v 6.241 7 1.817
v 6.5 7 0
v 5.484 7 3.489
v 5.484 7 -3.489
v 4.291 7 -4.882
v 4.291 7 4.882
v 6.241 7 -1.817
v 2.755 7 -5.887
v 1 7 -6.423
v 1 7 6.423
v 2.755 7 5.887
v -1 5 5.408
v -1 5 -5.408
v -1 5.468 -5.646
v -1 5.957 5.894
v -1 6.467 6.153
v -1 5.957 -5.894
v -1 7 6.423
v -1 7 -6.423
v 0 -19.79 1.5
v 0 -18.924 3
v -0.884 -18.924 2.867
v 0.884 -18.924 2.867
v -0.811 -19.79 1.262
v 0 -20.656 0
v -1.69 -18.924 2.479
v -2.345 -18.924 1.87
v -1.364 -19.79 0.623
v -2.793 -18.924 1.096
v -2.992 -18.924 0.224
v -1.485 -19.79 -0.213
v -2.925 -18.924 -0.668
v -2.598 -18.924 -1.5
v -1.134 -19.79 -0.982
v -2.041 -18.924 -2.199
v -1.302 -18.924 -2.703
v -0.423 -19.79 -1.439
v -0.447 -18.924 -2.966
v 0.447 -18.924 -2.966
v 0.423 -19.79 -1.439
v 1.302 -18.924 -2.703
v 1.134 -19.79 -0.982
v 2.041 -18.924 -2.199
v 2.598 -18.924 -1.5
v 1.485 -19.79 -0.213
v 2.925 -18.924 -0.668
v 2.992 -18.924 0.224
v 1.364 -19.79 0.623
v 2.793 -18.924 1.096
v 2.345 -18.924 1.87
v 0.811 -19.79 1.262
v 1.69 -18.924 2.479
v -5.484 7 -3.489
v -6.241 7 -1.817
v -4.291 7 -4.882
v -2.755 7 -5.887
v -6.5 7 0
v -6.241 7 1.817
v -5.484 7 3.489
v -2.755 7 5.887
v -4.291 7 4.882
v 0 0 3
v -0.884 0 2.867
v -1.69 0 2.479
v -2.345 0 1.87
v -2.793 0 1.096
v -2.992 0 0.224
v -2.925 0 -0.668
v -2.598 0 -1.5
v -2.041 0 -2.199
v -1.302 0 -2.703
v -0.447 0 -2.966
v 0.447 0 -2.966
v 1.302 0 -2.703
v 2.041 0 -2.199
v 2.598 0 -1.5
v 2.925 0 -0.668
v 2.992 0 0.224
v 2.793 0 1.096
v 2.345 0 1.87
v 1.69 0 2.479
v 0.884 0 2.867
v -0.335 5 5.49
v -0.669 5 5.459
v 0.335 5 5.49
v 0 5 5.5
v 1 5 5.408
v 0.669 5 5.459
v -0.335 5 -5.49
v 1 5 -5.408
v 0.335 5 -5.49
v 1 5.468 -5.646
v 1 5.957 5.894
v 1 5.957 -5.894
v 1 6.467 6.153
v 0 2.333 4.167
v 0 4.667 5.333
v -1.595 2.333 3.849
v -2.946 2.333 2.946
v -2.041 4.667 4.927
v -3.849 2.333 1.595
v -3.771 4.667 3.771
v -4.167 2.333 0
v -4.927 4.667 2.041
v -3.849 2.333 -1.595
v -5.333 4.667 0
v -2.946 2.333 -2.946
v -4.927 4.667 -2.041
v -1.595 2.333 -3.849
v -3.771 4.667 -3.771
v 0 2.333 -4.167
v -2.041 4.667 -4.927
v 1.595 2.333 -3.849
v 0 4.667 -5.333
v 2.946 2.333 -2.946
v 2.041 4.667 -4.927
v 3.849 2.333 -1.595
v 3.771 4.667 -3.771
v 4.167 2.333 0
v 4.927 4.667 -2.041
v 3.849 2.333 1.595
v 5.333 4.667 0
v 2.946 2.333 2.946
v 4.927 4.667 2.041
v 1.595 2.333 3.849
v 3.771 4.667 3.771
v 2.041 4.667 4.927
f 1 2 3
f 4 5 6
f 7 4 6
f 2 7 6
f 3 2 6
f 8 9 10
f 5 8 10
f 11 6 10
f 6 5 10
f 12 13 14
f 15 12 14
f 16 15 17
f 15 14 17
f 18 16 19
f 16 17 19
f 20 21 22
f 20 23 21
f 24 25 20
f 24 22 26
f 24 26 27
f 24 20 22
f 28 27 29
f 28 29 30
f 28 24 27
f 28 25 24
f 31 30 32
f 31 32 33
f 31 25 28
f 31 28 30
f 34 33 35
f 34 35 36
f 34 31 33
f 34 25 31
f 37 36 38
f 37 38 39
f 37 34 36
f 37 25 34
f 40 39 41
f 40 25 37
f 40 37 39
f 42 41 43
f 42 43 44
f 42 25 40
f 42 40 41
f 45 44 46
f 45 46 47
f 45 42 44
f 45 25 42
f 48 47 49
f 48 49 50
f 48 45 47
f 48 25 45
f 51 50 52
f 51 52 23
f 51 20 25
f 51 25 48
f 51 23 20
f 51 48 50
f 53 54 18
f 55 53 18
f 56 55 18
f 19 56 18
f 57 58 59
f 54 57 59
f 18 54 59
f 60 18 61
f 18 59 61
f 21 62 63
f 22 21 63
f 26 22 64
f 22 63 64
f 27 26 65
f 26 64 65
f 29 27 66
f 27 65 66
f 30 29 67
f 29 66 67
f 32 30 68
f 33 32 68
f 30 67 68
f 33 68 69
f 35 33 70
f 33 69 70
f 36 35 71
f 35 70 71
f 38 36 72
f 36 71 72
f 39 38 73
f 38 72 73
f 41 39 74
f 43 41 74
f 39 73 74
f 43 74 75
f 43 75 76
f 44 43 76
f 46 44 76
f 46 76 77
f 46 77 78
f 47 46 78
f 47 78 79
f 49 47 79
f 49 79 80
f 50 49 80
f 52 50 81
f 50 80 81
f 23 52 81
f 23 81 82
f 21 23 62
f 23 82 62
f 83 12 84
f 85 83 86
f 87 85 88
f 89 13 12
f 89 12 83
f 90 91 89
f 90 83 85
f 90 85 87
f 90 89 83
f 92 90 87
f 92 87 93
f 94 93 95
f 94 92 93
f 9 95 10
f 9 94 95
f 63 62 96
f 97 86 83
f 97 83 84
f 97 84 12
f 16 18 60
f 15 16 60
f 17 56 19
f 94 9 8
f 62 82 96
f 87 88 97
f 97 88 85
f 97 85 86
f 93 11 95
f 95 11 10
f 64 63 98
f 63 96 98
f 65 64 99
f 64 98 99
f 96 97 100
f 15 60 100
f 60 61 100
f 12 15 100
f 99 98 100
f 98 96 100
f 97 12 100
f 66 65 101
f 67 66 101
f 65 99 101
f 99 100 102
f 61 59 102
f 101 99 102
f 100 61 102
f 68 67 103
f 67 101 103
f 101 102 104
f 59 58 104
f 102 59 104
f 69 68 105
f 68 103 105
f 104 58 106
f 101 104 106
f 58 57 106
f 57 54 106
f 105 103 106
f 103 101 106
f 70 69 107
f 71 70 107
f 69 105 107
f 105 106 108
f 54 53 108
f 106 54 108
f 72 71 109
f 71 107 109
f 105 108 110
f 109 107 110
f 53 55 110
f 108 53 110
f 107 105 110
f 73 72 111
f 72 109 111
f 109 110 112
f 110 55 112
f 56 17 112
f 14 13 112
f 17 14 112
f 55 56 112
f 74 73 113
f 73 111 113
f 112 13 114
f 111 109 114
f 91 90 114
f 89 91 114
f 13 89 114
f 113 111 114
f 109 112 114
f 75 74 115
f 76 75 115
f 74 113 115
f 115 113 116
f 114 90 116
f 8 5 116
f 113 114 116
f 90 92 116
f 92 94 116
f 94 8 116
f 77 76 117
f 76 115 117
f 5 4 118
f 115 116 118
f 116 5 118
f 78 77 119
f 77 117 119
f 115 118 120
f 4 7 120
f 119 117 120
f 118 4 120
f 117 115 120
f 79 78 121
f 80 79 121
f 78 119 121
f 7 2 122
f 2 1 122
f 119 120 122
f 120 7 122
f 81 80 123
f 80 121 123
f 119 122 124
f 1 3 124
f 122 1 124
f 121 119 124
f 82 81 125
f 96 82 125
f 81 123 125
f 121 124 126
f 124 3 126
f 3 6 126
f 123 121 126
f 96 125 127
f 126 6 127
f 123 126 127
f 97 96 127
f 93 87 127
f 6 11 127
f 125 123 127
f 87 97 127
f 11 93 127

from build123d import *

# Parameters (mm, degrees)
CUT_EXTRUDE1_DEPTH      = 23.609258984
CUT_EXTRUDE1_DEPTH_BACK = 23.609258984
SKETCH3_W               = 2
SKETCH3_H               = 2


with BuildPart() as part:
    # Sketch1 → Revolve3 (revolve)
    with BuildSketch(Plane.XY, mode=Mode.PRIVATE) as revolve3_sk:
        Polygon((0, 0), (0, -18.924149032), (-3, -18.924149032), (-3, 0), (-6.5, 7), (-1, 7), (-1, 5), (0, 5), align=None)
    revolve(revolve3_sk.sketch.rotate(Axis((0, 5, 0), (0, -1, 0)), 270), axis=Axis((0, 5, 0), (0, -1, 0)))

    # Sketch2 → Revolve4 (revolve)
    with BuildSketch(Plane.XY, mode=Mode.PRIVATE) as revolve4_sk:
        Polygon((-3, -18.924149032), (0, -20.656199839), (0, -18.924149032), align=None)
    revolve(revolve4_sk.sketch.rotate(Axis((0, -18.924149032, 0), (0, -1, 0)), 270), axis=Axis((0, -18.924149032, 0), (0, -1, 0)))

    # Sketch3 → Cut-Extrude1 (cut, two sides: drawn at the far end of the back side and taken through both)
    with BuildSketch(Plane.XY.offset(-CUT_EXTRUDE1_DEPTH_BACK)):
        with Locations((0, 6)):
            Rectangle(SKETCH3_W, SKETCH3_H)
    extrude(amount=CUT_EXTRUDE1_DEPTH + CUT_EXTRUDE1_DEPTH_BACK, mode=Mode.SUBTRACT)


solid = part.part
